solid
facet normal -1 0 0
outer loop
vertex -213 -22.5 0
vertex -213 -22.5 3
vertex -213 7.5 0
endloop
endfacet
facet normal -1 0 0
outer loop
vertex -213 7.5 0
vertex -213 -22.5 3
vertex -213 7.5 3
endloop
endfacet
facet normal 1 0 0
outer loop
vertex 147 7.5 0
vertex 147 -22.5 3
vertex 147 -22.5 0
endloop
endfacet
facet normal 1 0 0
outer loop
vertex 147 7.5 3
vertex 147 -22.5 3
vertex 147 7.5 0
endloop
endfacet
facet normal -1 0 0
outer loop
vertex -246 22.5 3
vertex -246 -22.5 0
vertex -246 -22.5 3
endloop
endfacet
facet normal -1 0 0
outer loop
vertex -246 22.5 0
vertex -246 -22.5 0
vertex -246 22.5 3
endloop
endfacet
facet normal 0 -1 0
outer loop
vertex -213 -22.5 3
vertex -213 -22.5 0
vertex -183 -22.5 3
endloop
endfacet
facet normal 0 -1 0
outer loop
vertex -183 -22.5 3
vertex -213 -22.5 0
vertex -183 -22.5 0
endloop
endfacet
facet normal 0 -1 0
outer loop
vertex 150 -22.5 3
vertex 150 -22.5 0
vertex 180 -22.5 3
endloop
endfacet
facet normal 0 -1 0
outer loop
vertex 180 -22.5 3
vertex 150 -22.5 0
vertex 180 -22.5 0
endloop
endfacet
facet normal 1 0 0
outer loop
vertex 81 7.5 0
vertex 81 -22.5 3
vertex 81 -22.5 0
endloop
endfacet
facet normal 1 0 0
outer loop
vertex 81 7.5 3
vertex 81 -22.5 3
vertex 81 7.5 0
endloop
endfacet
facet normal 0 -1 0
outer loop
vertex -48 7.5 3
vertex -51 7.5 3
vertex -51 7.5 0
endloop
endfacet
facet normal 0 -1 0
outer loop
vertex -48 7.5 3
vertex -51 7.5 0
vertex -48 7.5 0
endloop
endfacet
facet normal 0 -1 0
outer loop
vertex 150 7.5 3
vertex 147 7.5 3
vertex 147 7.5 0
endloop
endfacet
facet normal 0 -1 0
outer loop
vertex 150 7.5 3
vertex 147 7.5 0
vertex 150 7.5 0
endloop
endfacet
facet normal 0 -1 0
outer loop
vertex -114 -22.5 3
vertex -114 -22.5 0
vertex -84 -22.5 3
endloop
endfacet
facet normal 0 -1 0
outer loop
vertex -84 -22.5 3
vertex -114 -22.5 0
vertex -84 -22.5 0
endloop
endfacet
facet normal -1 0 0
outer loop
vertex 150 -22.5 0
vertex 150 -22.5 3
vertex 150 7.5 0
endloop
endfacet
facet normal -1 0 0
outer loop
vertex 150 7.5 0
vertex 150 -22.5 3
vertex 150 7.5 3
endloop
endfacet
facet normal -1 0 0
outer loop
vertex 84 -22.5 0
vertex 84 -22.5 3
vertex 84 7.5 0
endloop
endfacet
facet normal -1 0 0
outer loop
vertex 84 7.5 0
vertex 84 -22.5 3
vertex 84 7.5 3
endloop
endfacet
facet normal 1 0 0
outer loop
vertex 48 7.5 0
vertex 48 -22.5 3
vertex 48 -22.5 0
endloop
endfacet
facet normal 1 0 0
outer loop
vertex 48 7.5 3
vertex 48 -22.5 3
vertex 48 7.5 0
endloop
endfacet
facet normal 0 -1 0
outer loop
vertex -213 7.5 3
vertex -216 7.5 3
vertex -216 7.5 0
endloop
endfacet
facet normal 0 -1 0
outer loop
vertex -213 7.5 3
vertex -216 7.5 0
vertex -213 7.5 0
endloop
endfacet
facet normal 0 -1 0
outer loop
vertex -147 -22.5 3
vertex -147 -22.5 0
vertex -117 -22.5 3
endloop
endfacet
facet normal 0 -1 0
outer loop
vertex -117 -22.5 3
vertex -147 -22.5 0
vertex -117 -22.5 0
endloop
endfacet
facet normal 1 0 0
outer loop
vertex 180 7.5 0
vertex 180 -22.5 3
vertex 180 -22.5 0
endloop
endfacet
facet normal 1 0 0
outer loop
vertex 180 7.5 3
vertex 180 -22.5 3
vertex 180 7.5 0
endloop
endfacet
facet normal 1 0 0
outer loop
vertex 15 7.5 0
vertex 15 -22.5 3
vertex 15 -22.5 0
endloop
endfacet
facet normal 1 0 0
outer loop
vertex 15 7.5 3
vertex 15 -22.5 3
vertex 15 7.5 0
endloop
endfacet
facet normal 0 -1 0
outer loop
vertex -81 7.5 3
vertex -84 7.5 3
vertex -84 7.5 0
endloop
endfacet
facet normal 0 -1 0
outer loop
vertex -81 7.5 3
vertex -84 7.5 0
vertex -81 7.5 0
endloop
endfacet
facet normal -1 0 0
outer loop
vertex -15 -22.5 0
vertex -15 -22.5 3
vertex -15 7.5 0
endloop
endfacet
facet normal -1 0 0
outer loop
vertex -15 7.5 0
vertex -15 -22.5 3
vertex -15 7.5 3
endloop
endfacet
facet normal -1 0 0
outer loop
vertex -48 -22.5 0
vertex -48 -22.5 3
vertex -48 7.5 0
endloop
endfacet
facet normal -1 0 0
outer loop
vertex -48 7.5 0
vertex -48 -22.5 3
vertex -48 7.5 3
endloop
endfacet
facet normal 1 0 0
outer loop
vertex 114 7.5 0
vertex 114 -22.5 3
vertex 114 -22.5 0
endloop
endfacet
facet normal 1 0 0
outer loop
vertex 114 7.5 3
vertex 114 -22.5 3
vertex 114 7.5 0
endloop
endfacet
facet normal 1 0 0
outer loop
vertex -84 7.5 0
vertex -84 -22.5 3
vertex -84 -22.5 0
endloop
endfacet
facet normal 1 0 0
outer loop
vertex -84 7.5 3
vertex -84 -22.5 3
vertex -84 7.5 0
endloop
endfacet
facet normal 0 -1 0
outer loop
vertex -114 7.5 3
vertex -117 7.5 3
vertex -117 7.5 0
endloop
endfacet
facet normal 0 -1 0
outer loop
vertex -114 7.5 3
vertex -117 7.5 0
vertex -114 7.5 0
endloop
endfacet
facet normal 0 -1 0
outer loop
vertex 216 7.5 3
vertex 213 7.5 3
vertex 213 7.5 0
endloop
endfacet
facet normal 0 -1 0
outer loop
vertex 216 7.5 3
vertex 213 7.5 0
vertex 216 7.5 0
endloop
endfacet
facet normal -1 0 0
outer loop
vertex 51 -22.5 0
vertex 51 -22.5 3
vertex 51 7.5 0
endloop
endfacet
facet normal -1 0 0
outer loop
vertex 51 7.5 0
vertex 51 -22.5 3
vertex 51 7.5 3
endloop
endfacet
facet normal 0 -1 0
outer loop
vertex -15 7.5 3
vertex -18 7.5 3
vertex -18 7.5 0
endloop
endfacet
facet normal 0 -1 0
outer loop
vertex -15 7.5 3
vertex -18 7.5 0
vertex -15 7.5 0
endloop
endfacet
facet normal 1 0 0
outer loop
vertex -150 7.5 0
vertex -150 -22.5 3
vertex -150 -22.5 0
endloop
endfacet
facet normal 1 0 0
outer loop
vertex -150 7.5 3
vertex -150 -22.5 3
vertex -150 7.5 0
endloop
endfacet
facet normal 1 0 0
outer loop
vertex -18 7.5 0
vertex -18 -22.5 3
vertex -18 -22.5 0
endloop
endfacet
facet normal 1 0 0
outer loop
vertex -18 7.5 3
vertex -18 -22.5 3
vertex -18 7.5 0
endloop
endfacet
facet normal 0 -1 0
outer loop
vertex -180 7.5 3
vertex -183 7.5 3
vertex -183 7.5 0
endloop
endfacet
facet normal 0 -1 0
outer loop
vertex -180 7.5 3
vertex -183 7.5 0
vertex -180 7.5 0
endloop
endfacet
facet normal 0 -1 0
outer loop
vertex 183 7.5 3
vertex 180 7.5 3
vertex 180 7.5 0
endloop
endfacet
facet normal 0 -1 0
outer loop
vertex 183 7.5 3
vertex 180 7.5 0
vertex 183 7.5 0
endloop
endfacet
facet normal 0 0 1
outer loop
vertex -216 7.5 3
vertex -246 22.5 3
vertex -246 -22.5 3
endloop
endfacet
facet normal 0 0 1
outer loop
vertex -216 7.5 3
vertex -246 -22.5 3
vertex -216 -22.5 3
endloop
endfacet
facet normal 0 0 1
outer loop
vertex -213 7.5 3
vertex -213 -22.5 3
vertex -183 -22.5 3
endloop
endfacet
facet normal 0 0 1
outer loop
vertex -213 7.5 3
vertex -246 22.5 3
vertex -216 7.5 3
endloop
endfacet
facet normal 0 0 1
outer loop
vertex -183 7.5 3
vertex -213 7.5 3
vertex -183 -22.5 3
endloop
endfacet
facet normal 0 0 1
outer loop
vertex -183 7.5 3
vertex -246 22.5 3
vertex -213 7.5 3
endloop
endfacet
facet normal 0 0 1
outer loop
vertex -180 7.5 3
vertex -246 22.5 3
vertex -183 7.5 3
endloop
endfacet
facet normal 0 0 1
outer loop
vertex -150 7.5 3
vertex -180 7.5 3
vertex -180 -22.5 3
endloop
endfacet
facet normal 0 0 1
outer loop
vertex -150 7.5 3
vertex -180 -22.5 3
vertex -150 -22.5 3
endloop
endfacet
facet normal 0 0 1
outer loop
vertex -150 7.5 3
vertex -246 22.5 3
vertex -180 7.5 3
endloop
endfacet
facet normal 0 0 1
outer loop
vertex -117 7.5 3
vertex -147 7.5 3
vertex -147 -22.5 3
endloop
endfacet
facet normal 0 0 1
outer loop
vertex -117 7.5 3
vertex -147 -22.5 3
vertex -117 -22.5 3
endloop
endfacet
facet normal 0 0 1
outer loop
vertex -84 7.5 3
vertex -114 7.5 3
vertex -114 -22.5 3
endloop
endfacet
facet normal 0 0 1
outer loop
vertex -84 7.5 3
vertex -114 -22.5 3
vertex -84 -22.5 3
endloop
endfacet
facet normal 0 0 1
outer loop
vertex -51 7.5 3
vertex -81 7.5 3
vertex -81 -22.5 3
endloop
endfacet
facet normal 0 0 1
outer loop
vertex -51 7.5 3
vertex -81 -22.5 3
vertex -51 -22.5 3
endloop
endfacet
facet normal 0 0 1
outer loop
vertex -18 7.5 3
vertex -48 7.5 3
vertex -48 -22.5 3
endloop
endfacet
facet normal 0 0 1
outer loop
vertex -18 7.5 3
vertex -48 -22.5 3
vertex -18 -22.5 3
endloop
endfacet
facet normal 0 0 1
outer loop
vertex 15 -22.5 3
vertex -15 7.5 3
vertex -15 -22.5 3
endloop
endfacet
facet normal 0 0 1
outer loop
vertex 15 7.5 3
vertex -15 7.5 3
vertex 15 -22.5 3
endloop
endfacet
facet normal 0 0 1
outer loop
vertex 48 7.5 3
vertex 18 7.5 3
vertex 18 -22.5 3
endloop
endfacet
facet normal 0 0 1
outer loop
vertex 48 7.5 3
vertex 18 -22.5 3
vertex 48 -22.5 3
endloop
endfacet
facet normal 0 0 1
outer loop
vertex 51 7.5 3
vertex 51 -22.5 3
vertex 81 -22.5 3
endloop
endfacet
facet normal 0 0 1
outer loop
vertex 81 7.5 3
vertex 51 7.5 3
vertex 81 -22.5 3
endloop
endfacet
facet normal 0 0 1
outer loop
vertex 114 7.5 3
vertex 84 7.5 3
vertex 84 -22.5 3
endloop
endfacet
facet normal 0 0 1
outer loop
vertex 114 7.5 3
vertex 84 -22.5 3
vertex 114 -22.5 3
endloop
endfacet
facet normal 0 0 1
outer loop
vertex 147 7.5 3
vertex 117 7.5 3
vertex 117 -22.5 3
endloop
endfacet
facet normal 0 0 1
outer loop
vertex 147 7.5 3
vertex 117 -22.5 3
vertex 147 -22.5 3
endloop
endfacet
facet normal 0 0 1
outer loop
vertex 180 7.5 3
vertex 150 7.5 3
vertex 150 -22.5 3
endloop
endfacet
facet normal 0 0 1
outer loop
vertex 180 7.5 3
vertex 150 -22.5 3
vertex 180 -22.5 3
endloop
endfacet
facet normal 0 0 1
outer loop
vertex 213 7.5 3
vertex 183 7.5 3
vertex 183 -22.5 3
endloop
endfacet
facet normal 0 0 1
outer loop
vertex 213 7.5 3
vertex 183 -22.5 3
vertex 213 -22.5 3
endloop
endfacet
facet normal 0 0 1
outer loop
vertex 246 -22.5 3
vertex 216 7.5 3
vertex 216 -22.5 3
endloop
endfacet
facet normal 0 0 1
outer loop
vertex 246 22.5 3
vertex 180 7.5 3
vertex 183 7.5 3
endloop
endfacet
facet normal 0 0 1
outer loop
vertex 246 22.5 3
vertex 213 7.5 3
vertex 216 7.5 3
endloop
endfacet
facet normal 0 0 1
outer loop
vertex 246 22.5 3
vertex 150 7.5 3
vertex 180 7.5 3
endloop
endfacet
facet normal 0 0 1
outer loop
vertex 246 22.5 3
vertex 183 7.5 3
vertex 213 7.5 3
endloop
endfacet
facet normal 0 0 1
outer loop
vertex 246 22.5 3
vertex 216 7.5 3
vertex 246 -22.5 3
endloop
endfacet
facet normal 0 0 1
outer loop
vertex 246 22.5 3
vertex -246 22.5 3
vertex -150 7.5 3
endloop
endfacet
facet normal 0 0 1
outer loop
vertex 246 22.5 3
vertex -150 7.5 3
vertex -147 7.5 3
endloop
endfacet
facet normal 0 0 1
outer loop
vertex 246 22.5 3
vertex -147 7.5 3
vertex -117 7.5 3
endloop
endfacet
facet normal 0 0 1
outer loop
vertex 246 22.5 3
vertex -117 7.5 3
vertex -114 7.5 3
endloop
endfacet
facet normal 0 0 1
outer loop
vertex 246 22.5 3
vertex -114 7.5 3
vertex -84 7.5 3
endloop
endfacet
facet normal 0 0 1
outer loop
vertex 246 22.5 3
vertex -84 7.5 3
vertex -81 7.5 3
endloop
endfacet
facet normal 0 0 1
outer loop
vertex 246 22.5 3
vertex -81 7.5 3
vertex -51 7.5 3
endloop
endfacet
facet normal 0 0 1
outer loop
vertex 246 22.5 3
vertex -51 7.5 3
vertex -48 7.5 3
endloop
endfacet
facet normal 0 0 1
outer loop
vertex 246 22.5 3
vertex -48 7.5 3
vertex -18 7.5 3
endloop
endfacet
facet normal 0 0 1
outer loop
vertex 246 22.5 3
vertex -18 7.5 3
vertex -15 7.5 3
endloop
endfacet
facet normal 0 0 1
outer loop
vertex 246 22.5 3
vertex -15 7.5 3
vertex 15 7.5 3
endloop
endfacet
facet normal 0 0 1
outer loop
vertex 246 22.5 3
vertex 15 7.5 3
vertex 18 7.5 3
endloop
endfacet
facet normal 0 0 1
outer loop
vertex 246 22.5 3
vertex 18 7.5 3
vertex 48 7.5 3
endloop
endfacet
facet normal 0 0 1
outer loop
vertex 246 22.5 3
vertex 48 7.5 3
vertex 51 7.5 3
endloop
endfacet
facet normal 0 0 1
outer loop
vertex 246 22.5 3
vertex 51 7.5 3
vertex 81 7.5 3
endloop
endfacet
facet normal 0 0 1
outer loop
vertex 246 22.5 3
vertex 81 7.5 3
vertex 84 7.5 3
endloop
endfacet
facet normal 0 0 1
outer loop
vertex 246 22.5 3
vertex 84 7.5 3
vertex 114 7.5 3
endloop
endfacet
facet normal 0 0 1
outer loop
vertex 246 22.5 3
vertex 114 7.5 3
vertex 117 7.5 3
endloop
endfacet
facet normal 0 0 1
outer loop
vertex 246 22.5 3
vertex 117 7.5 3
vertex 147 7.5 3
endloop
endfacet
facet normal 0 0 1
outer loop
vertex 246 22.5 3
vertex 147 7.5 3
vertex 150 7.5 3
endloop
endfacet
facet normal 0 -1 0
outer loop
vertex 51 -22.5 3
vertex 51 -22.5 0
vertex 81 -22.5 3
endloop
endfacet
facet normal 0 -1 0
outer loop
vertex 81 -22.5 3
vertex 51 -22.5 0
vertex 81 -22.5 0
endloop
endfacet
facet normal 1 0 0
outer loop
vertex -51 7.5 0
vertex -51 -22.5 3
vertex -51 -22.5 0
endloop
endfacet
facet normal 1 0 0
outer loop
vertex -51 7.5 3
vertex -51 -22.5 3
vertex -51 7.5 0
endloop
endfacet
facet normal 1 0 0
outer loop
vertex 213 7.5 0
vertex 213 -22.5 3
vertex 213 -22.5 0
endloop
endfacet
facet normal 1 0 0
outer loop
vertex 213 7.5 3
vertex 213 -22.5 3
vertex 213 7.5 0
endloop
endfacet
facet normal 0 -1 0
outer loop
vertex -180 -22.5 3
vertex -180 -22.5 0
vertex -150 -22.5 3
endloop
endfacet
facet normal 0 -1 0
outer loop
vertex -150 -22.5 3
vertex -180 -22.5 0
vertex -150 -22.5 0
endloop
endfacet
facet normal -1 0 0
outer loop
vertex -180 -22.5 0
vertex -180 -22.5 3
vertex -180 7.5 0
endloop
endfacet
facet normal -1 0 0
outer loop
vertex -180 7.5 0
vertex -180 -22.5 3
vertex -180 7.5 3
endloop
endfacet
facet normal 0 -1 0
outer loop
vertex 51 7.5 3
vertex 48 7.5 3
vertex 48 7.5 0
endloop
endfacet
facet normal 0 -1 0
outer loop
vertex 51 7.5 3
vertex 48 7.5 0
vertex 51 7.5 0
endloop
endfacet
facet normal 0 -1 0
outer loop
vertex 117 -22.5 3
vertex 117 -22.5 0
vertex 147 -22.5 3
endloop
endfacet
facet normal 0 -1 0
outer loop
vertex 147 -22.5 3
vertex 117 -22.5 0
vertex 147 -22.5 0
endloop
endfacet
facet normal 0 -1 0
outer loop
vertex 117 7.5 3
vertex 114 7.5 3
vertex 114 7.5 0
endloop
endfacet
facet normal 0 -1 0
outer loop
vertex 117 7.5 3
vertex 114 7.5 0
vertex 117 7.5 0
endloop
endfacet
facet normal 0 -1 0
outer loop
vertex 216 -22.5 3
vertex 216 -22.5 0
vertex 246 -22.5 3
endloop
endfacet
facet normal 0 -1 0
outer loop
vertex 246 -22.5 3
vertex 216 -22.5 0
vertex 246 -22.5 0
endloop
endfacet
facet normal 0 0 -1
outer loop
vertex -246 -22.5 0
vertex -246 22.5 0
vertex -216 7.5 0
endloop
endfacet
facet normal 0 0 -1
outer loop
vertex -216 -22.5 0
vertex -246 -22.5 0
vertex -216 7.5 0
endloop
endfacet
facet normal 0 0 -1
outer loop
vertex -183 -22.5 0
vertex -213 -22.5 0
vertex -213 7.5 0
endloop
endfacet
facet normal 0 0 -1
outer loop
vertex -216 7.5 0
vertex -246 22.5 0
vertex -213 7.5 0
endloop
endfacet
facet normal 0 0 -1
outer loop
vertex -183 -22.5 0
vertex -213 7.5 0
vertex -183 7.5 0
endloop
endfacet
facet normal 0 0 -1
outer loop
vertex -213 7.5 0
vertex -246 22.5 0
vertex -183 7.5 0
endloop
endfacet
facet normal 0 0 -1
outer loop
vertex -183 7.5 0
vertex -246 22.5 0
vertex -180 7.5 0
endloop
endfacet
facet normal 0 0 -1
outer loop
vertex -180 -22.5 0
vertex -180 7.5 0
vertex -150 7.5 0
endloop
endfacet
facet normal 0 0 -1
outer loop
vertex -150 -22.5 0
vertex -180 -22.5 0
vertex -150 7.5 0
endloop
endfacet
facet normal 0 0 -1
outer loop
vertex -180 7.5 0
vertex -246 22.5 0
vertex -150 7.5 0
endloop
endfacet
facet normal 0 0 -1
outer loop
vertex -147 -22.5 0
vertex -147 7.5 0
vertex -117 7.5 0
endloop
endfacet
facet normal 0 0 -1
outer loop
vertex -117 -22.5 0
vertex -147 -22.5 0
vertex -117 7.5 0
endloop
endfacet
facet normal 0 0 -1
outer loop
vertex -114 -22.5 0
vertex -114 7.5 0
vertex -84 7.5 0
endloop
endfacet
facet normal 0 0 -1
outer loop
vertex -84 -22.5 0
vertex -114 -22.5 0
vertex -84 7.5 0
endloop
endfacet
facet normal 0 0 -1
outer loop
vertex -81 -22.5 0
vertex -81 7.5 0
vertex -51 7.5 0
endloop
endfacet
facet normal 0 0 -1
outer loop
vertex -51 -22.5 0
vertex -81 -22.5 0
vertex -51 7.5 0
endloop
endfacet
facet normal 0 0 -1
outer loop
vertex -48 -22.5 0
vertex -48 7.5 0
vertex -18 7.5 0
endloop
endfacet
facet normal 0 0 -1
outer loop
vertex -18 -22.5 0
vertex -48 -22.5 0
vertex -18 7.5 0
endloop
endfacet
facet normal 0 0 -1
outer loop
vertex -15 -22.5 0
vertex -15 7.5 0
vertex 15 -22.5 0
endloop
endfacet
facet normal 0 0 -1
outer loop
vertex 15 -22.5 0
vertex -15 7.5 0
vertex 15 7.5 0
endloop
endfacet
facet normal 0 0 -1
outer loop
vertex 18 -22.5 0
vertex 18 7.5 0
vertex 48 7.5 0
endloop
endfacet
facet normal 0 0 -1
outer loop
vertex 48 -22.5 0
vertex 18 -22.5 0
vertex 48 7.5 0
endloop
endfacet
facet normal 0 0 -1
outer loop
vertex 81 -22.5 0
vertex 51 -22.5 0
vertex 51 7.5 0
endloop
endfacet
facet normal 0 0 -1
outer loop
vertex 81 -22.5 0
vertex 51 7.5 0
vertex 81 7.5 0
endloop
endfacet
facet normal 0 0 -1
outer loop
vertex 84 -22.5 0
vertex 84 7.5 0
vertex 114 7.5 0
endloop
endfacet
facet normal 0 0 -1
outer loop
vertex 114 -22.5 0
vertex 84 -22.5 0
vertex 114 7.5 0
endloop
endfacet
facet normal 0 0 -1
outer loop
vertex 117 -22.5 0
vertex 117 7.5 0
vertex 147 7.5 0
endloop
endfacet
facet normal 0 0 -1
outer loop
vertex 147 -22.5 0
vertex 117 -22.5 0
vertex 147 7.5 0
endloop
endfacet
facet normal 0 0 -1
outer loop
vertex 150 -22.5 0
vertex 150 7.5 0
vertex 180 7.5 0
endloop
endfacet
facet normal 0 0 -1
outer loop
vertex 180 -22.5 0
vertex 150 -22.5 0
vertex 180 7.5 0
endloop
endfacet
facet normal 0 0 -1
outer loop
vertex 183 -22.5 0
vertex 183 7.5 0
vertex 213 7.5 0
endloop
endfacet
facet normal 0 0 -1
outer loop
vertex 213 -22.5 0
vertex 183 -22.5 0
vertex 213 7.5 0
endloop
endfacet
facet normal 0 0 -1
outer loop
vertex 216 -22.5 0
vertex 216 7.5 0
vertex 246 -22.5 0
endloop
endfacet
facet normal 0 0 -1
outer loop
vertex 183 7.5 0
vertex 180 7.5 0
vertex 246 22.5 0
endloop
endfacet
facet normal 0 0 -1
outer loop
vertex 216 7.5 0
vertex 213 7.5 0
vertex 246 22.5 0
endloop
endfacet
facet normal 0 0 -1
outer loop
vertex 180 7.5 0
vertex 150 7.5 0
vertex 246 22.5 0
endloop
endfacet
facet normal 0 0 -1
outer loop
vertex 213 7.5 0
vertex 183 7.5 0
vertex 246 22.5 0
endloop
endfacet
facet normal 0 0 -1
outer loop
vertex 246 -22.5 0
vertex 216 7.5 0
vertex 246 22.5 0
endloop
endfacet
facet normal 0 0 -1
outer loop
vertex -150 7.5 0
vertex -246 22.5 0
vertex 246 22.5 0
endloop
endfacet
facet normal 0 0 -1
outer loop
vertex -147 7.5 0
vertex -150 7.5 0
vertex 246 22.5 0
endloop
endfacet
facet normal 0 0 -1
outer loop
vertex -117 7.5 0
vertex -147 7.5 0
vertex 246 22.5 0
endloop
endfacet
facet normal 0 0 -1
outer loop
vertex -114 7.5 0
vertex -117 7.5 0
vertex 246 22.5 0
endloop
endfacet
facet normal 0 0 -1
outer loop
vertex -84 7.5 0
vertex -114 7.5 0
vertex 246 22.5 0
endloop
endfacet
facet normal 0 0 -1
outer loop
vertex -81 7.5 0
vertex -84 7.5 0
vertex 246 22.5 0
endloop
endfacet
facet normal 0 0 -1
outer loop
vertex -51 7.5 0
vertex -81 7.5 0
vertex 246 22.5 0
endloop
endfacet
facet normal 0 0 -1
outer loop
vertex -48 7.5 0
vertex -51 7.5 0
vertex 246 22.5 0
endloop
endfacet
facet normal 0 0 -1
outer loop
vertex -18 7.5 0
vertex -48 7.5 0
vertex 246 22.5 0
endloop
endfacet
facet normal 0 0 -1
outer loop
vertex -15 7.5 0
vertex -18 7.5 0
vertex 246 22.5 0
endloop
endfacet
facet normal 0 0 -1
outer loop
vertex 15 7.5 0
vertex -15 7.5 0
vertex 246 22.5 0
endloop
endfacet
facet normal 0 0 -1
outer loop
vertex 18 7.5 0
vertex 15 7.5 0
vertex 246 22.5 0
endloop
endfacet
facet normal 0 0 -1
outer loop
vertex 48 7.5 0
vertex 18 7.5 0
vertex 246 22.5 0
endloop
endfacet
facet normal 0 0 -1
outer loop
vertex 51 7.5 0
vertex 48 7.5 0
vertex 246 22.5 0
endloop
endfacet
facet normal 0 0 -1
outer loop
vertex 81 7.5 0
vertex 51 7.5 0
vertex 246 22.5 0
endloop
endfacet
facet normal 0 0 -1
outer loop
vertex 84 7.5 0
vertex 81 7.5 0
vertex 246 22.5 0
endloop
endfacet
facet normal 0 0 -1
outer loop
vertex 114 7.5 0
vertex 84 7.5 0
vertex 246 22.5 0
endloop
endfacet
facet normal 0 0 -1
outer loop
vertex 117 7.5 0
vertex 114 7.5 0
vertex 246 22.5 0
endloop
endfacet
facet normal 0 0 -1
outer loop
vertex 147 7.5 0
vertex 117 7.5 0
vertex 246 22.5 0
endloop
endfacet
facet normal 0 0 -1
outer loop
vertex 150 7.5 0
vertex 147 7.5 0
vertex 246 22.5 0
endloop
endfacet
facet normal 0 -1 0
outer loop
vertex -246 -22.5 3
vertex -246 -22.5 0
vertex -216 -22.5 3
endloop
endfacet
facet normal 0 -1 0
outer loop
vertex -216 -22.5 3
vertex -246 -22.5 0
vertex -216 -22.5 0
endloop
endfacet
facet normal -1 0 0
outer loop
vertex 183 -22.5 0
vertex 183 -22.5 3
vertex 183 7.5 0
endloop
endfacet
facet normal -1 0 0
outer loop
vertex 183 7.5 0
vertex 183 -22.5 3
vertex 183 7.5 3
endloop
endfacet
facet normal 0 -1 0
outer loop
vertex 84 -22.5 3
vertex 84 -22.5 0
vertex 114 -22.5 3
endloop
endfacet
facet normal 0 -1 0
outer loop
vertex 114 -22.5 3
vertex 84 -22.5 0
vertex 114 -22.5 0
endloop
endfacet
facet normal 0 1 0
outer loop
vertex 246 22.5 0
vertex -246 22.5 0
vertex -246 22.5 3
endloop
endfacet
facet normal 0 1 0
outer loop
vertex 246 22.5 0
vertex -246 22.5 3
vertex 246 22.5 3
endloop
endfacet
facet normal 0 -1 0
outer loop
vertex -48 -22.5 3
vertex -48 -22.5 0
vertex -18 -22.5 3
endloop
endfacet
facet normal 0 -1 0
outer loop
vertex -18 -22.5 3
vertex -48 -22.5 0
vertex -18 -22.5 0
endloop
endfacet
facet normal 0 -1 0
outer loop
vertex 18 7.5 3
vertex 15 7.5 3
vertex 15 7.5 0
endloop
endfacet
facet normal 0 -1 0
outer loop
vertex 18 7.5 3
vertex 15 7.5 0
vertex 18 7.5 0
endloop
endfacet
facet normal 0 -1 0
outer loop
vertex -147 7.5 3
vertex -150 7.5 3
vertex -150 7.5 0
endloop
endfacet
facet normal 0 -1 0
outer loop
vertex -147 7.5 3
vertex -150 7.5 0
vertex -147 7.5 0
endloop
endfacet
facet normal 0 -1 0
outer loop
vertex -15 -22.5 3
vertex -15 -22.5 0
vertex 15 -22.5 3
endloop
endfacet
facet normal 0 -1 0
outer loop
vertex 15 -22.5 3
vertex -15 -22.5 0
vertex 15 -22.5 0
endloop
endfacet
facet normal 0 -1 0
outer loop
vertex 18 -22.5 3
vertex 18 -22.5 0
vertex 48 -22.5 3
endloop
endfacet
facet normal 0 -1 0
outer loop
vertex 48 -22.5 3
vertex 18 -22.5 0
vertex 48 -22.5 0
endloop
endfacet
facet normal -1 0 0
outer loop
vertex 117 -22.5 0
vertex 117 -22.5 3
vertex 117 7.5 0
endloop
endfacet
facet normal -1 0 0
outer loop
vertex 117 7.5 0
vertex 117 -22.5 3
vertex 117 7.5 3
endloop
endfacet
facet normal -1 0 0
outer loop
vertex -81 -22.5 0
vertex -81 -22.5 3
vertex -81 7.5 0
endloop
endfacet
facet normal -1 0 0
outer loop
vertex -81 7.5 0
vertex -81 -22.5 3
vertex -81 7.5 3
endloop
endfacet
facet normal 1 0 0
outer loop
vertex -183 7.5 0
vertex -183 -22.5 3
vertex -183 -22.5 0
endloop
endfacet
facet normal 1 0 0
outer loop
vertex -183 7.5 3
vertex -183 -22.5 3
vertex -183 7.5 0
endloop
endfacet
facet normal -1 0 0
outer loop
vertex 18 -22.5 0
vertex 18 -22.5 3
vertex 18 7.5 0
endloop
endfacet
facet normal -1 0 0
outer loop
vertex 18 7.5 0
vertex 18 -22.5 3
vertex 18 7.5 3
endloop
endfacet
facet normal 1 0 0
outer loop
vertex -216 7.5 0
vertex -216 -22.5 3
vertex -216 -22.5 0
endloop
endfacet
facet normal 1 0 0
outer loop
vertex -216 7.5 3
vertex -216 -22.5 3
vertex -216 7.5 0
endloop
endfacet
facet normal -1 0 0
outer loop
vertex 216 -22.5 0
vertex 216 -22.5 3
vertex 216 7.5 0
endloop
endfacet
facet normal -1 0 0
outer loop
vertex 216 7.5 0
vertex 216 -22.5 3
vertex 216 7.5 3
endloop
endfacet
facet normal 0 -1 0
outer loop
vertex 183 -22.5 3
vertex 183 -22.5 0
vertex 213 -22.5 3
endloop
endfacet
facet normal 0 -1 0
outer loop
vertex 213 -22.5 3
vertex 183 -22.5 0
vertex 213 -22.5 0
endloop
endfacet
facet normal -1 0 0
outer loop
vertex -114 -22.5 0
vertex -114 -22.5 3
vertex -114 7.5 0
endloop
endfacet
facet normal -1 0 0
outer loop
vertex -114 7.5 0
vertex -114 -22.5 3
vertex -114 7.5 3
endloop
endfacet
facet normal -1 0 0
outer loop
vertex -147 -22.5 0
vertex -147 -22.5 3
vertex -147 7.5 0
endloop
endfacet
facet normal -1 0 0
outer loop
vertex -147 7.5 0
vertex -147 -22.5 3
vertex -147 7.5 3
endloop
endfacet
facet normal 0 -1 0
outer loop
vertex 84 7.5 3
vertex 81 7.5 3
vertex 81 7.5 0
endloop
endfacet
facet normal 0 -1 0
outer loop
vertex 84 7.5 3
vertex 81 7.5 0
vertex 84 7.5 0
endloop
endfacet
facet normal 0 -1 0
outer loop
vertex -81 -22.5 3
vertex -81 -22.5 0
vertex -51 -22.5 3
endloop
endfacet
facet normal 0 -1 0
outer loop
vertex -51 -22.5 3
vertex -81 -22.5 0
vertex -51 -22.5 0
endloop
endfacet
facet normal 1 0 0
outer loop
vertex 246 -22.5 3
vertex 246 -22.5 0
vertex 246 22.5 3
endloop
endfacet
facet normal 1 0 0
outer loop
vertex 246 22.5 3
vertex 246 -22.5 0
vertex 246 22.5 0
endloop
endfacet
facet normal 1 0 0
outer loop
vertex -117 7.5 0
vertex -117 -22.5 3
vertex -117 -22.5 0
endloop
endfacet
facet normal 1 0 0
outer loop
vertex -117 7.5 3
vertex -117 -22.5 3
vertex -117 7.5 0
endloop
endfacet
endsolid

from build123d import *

# Parameters (mm, degrees)
SKETCH1_W           = 492
SKETCH1_H           = 45
BOSS_EXTRUDE1_DEPTH = 3
SKETCH2_W           = 3
SKETCH2_H           = 30
CUT_EXTRUDE1_DEPTH  = 4
LPATTERN1_COUNT     = 14
LPATTERN1_PITCH     = 33


with BuildPart() as part:
    # Sketch1 → Boss-Extrude1 (new body)
    with BuildSketch(Plane.XY):
        Rectangle(SKETCH1_W, SKETCH1_H)
    extrude(amount=BOSS_EXTRUDE1_DEPTH)

    # Sketch2 → Cut-Extrude1 (cut, through all)
    with BuildSketch(Plane.XY.offset(3)):
        with Locations((-214.5, -7.5)):
            Rectangle(SKETCH2_W, SKETCH2_H)
    cut_extrude1 = extrude(amount=-CUT_EXTRUDE1_DEPTH, mode=Mode.SUBTRACT)

    # LPattern1: Cut-Extrude1 ×14
    with Locations(*[(i * LPATTERN1_PITCH, 0, 0) for i in range(1, LPATTERN1_COUNT)]):
        add(cut_extrude1, mode=Mode.SUBTRACT)


solid = part.part
